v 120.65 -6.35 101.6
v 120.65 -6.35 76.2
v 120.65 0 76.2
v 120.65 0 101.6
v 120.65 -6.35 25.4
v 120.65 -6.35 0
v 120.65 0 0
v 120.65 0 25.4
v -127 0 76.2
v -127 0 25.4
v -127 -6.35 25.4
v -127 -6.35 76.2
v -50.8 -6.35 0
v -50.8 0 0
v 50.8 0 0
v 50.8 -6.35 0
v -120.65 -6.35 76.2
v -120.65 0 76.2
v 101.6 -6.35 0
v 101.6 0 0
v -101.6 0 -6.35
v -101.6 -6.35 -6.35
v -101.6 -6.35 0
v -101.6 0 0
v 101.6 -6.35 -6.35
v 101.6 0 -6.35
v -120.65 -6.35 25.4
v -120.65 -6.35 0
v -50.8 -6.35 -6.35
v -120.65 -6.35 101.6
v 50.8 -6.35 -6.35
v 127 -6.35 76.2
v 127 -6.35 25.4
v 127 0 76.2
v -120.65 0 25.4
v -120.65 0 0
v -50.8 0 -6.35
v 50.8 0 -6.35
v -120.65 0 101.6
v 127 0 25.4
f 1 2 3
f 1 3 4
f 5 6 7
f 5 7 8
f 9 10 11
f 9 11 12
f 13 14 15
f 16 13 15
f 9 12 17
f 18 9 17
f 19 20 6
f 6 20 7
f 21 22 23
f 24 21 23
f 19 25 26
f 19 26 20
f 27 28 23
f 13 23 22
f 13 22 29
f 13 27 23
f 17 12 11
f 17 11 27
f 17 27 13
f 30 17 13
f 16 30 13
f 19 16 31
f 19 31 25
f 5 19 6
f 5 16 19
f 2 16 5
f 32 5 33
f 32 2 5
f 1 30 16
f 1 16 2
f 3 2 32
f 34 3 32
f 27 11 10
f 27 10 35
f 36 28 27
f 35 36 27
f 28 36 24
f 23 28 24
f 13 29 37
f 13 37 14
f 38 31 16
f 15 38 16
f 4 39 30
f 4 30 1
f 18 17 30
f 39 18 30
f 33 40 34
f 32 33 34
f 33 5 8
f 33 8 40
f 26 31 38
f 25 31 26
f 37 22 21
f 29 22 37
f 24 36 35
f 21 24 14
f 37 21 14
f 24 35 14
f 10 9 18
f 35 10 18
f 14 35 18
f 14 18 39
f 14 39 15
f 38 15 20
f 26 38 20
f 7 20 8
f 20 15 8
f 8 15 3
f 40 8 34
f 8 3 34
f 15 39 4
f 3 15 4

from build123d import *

# Parameters (mm, degrees)
F0_W     = 254
F0_H     = 101.6
F1_DEPTH = 6.35
F2_W     = 50.8
F2_H     = 6.35
F3_DEPTH = 6.35
F4_W     = 6.35
F4_H     = 25.4
F5_DEPTH = 25.4


with BuildPart() as f1:
    # F0 (on Front) → F1 (new body)
    with BuildSketch(Plane.XZ):
        with Locations((0, 50.8)):
            Rectangle(F0_W, F0_H)
    extrude(amount=F1_DEPTH)

    # F2 (on face) → F3 (join)
    with BuildSketch(Plane.XZ.offset(6.35)):
        with Locations((76.2, -3.175)):
            Rectangle(F2_W, F2_H)
        with Locations((-76.2, -3.175)):
            Rectangle(F2_W, F2_H)
    extrude(amount=-F3_DEPTH)

    # F4 (on face) → F5 (cut)
    with BuildSketch(Plane.XZ.offset(6.35)):
        with Locations((123.825, 88.9)):
            Rectangle(F4_W, F4_H)
        with Locations((123.825, 12.7)):
            Rectangle(F4_W, F4_H)
        with Locations((-123.825, 12.7)):
            Rectangle(F4_W, F4_H)
        with Locations((-123.825, 88.9)):
            Rectangle(F4_W, F4_H)
    extrude(amount=-F5_DEPTH, mode=Mode.SUBTRACT)


solid = f1.part
